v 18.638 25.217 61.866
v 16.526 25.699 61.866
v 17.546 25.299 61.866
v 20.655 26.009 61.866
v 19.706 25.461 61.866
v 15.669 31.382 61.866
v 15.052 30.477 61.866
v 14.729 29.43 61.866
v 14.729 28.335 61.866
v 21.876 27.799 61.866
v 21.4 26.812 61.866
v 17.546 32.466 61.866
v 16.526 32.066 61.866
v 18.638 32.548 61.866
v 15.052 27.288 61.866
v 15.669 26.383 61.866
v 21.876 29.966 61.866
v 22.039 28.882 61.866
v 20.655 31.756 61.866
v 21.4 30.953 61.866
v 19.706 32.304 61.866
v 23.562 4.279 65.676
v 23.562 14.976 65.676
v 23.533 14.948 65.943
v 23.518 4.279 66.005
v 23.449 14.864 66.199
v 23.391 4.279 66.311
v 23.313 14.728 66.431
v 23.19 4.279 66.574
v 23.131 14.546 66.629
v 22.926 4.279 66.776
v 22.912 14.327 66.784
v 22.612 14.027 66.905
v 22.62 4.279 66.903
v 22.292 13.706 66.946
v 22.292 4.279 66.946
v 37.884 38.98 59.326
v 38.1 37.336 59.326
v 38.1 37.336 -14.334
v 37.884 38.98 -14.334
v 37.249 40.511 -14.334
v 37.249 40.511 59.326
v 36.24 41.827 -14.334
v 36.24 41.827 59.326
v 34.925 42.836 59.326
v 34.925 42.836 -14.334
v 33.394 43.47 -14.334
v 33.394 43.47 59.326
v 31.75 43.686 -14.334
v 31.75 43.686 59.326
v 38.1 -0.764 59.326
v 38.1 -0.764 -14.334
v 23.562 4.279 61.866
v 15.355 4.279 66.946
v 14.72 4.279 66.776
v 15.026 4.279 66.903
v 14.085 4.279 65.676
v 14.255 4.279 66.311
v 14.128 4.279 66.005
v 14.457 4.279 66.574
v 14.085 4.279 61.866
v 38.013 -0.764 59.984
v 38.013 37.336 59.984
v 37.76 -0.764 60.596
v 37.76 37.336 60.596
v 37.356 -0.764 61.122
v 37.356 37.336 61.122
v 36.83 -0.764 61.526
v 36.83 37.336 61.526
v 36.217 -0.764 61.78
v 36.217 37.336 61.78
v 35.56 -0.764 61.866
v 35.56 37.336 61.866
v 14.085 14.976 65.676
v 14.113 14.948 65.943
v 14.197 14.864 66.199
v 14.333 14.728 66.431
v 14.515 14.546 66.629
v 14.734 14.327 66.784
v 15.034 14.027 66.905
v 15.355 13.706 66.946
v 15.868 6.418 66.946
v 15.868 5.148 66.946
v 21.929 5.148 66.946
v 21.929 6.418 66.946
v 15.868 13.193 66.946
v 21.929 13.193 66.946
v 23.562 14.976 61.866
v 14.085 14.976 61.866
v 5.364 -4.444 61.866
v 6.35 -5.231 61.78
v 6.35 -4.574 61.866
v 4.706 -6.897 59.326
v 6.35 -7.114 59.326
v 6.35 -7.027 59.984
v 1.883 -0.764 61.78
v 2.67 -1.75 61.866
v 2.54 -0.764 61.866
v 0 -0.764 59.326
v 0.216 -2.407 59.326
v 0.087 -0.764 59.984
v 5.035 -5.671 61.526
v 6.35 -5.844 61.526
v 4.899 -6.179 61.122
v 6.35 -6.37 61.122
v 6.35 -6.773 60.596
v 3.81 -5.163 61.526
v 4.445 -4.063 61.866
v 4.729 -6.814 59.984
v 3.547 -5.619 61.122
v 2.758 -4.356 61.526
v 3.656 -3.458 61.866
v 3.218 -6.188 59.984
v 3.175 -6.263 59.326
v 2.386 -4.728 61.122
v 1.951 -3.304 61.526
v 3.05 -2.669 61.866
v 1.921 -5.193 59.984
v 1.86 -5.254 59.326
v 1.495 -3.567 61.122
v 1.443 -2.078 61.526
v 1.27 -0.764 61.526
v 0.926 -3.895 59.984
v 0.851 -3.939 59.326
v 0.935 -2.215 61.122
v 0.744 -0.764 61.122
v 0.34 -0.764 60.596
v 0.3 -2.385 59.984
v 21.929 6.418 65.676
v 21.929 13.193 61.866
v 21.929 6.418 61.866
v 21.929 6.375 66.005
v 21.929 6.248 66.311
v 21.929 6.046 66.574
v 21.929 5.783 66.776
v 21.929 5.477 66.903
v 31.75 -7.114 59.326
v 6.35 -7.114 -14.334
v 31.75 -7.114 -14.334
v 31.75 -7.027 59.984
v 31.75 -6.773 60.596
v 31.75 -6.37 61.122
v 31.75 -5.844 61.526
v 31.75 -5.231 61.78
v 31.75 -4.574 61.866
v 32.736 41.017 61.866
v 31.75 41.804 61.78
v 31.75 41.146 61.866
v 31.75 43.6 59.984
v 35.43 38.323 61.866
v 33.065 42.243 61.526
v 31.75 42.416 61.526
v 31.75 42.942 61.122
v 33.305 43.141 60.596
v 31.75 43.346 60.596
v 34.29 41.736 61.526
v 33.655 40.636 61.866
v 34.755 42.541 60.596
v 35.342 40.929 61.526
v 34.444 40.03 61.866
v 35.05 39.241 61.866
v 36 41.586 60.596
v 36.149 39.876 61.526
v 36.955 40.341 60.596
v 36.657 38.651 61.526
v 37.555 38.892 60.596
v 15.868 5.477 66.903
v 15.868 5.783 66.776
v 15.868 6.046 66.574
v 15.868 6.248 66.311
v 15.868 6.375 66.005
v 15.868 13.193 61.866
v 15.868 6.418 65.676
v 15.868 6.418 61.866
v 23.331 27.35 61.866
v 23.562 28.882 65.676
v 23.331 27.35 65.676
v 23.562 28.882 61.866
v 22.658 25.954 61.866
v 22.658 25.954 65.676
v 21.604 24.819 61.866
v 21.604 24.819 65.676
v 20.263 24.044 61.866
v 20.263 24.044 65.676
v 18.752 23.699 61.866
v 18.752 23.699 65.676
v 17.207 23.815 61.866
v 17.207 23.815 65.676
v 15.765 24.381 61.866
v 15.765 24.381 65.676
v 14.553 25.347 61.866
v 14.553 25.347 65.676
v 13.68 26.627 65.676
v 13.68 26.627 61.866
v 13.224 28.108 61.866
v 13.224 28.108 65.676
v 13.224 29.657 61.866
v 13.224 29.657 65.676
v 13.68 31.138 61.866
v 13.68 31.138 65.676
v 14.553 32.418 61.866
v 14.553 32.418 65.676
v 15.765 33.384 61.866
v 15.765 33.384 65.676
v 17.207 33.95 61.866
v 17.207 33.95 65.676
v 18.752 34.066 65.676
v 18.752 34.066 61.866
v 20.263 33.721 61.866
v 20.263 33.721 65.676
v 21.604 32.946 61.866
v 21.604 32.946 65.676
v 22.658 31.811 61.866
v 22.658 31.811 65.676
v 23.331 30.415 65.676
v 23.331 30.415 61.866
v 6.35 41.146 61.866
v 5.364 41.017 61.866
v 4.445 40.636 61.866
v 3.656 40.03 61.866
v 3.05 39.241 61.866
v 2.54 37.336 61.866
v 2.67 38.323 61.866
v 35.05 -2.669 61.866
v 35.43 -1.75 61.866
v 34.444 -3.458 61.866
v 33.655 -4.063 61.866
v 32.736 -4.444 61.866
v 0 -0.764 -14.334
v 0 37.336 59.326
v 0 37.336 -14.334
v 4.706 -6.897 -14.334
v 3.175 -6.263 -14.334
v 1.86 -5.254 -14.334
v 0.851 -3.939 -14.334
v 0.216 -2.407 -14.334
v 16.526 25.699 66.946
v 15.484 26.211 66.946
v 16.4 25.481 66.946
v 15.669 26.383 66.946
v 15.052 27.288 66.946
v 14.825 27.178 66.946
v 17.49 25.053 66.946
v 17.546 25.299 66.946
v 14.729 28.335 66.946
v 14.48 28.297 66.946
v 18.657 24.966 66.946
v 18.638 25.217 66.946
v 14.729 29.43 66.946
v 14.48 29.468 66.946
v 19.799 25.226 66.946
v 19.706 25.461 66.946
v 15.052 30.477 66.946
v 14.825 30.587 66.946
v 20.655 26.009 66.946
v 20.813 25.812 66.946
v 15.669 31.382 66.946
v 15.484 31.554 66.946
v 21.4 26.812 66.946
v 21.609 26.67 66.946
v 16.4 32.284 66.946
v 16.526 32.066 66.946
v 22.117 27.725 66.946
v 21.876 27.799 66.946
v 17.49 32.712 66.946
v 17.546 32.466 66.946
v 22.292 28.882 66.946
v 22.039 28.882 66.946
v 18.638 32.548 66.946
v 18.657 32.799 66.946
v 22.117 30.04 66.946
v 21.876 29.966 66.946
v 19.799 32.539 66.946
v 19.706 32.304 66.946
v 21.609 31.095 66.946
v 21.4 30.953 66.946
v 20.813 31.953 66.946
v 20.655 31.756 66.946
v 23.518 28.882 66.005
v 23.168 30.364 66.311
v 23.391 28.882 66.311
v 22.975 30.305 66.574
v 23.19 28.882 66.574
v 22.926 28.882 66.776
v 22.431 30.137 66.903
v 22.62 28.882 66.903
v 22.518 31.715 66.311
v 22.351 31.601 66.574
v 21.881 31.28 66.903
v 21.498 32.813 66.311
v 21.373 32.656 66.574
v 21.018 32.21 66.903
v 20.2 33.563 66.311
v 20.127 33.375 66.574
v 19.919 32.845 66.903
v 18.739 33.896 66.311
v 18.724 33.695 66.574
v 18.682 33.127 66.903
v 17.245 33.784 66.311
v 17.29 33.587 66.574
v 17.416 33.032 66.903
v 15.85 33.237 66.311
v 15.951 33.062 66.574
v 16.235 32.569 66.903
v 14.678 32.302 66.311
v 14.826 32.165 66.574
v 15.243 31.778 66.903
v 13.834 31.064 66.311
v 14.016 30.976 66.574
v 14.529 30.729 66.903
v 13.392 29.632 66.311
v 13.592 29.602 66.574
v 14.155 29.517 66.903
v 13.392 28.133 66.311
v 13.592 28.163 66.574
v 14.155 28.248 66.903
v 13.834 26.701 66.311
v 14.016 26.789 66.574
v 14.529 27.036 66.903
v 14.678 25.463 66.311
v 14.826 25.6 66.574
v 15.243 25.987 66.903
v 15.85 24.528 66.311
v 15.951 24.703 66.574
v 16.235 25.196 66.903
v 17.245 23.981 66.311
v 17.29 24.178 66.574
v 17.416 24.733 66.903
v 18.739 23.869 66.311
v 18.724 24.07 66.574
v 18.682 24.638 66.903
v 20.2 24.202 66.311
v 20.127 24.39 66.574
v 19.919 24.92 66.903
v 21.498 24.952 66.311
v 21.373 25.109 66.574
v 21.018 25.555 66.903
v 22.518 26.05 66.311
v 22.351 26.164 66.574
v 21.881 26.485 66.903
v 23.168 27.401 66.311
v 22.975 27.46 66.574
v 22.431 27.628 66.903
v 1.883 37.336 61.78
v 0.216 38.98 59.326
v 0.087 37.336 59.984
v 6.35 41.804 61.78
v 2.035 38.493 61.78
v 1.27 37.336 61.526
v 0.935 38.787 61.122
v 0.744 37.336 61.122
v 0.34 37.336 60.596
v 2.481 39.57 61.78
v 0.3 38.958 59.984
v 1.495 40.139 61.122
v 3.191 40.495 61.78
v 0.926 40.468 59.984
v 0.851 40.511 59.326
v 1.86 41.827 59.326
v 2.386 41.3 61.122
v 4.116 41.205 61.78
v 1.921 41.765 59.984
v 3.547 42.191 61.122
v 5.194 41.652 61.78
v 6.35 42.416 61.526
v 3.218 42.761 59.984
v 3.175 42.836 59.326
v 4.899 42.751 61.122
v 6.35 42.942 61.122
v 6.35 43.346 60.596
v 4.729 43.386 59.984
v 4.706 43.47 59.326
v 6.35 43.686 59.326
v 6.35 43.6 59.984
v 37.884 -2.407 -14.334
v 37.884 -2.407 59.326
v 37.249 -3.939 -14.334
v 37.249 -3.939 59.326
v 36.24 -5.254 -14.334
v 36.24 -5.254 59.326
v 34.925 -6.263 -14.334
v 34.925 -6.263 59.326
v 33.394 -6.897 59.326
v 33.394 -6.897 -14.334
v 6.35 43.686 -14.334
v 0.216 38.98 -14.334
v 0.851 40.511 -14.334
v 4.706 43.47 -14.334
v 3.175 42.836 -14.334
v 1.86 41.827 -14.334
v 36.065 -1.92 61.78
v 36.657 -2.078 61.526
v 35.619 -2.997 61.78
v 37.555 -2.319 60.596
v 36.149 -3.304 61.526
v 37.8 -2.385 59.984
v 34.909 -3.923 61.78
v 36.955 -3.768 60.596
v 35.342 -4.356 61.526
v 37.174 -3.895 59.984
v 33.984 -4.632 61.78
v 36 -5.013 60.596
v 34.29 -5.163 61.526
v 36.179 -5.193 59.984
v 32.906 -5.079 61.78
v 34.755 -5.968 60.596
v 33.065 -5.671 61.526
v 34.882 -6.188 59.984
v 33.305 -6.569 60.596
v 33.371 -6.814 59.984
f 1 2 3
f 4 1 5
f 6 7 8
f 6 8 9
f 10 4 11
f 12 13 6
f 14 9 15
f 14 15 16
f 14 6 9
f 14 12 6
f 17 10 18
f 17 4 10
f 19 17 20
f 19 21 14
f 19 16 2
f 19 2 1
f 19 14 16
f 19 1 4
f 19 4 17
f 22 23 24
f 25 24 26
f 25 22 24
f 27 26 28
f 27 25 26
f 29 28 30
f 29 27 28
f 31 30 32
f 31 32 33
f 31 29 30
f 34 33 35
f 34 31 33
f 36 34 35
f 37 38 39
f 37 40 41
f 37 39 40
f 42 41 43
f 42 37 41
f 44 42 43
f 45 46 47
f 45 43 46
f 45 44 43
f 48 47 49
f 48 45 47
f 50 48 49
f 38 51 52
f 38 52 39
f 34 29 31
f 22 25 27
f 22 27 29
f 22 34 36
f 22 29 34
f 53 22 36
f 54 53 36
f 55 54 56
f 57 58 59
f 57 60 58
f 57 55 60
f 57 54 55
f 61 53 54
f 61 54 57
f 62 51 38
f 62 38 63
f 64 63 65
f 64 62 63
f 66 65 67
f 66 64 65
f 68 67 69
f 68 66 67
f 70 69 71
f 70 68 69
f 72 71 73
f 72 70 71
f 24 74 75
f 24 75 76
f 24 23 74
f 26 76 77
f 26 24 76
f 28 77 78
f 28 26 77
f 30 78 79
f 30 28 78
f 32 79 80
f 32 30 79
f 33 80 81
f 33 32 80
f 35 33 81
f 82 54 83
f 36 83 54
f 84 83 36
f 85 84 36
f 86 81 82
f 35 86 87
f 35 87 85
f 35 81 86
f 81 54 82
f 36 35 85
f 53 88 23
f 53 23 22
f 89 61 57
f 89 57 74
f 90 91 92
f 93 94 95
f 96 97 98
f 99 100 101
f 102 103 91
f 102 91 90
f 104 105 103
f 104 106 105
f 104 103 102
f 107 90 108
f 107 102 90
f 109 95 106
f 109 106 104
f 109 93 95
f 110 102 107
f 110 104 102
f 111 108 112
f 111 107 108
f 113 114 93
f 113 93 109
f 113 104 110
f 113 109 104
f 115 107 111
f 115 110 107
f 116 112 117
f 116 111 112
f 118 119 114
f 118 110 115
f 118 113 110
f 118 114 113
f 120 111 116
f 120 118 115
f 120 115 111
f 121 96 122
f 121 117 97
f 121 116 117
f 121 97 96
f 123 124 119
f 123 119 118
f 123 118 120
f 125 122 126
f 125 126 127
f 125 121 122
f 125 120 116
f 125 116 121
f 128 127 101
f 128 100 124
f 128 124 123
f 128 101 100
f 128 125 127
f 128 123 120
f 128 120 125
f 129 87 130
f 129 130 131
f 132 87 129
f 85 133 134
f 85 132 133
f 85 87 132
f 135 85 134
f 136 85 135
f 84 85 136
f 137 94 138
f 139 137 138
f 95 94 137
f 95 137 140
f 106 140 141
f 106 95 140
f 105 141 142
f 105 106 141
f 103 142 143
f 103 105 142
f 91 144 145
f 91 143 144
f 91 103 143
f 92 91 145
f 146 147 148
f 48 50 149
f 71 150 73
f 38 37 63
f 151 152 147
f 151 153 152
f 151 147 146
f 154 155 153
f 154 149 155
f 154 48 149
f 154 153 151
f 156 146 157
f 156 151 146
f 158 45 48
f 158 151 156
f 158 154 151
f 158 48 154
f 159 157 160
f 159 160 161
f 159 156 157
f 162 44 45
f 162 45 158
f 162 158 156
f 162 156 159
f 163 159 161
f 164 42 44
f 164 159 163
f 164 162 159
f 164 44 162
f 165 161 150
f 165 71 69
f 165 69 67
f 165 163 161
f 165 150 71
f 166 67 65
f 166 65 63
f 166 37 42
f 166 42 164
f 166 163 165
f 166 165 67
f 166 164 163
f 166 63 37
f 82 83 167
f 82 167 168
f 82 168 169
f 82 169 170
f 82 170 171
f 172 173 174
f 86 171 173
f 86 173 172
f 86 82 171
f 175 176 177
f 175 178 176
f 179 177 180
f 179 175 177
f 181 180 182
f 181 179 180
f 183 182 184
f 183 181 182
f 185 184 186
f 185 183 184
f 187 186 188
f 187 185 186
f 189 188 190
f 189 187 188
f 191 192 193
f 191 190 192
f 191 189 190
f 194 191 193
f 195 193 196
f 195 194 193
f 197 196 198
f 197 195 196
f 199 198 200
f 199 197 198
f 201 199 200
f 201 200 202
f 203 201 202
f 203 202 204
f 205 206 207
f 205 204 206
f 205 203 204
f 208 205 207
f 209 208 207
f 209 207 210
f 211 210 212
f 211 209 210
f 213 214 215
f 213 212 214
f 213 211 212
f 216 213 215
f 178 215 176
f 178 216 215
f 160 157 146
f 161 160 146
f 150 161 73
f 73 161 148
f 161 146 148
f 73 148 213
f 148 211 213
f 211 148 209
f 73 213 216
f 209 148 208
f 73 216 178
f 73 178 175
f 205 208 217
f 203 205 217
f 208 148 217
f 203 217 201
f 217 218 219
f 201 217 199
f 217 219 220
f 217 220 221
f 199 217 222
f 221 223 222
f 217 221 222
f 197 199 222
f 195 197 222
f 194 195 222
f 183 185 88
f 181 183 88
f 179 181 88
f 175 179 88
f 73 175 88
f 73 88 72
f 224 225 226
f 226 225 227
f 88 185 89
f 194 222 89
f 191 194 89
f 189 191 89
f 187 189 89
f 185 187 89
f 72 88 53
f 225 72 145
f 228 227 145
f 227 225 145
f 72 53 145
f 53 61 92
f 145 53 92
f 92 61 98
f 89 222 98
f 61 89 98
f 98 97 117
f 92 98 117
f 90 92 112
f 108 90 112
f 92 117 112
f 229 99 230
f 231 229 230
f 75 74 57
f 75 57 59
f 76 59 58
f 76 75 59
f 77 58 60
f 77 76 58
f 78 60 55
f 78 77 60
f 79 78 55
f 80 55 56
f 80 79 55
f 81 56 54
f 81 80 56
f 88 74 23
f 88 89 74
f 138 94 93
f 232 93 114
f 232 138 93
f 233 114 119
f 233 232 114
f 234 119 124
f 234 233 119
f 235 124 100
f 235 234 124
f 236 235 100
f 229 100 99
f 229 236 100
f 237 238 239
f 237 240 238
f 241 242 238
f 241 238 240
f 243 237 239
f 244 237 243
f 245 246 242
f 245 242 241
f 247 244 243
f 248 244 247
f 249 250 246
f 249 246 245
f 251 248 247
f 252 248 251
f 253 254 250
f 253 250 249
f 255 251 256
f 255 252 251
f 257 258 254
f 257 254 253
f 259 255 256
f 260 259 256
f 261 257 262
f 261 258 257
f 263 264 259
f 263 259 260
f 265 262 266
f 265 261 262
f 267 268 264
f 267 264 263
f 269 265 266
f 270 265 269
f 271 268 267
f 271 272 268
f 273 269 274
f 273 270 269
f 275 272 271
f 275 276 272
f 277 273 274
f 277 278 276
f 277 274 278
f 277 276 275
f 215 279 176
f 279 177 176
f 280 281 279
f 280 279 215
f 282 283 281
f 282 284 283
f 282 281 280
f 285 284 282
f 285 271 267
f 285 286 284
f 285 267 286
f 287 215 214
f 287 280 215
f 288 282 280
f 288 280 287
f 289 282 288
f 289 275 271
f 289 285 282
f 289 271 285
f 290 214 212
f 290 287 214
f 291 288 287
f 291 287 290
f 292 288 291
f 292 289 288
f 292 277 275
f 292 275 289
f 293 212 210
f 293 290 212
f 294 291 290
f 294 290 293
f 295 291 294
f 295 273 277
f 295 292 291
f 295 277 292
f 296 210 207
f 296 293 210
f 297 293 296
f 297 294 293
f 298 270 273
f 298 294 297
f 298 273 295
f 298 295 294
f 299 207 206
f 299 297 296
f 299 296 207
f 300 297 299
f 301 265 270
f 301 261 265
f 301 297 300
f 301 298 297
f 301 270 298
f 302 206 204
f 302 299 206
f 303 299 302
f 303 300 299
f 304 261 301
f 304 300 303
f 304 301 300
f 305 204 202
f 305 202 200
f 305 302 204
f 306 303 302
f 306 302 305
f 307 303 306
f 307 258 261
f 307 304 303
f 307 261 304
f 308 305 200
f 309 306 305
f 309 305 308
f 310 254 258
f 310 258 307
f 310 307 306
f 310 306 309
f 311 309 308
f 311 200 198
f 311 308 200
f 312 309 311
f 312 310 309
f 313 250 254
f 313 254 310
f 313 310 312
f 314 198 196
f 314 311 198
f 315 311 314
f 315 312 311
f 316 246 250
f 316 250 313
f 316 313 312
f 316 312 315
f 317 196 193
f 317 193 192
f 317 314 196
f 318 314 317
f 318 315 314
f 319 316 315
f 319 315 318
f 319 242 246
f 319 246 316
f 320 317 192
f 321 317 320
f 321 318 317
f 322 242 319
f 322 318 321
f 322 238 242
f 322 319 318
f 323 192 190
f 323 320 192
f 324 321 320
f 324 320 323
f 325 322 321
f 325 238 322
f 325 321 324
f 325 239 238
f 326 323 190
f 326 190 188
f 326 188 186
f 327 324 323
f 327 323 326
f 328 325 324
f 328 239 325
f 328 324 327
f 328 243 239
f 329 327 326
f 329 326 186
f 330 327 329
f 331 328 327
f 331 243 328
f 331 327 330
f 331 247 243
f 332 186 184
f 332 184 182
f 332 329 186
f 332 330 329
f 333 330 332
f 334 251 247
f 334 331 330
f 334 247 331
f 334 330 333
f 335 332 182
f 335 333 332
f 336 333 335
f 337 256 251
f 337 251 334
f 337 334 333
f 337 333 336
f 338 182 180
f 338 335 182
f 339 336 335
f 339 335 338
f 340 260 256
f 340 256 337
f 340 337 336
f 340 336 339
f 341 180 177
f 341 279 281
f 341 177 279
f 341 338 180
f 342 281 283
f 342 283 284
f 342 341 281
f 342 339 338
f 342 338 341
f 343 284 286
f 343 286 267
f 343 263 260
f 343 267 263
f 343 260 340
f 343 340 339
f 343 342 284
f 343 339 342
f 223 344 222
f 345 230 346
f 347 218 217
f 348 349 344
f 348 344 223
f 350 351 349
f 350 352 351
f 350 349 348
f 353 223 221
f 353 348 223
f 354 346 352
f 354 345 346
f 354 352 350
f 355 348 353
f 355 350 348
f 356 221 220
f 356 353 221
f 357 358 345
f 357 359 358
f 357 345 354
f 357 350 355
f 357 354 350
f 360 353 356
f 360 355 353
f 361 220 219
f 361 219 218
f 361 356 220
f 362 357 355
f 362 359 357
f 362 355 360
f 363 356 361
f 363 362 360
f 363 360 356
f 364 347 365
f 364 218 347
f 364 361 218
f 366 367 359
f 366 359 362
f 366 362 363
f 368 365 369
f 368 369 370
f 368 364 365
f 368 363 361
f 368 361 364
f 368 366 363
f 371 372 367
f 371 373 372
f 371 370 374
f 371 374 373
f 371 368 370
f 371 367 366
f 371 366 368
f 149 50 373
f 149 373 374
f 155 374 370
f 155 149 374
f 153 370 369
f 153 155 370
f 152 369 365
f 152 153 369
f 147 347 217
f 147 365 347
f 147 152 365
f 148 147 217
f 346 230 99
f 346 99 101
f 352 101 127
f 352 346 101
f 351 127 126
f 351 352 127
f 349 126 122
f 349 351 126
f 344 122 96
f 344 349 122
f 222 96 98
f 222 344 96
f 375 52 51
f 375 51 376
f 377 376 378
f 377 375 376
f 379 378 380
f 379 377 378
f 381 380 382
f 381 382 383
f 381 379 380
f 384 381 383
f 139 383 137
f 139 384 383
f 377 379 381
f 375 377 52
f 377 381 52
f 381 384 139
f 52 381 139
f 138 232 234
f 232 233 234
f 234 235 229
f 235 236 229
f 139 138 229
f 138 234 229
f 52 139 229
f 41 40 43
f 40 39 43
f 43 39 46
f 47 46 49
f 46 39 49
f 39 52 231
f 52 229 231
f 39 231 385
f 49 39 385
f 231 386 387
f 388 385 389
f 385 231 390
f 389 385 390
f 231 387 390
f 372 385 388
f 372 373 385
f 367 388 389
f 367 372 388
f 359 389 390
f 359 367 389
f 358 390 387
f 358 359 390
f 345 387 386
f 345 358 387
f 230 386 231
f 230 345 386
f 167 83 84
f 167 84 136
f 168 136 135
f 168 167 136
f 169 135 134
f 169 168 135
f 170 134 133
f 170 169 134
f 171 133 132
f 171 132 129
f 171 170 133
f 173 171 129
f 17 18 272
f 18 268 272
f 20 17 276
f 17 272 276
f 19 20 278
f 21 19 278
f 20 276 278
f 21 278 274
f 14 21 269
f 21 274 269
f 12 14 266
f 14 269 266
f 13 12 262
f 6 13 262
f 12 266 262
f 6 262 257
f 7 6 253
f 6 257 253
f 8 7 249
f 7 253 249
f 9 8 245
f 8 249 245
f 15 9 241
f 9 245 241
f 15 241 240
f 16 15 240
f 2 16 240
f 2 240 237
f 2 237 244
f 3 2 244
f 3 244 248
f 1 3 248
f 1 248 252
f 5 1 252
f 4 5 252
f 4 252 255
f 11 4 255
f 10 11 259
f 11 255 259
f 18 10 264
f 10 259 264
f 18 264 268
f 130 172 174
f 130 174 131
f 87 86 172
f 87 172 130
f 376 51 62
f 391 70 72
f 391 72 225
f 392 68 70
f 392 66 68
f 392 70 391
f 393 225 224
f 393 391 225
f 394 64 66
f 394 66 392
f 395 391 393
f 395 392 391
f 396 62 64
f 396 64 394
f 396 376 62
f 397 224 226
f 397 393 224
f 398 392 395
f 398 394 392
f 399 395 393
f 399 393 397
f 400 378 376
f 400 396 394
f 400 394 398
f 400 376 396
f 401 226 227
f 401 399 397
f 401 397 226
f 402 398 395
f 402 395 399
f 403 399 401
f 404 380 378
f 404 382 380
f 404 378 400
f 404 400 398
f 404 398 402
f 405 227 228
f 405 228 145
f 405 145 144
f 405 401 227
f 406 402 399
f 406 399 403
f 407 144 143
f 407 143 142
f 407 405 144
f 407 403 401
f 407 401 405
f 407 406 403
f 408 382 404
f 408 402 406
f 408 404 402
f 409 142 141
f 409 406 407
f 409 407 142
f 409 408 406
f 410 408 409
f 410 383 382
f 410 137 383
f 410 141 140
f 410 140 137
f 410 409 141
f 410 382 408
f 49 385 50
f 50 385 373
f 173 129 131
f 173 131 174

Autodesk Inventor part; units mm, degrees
ref_plane "YZ Plane" through (0, 0, 0) normal (1, 0, 0) x (0, 1, 0)
ref_plane "XZ Plane" through (0, 0, 0) normal (0, 1, 0) x (-1, 0, 0)
ref_plane "XY Plane" through (0, 0, 0) normal (0, 0, 1) x (1, 0, 0)
sketch "Sketch1" plane through (0, 0, 0) normal (1, 0, 0) x (0, 1, 0)
  line L0 (43.6864, 61.8662) -> (-7.1136, 61.8662)
  line L1 (-7.1136, 61.8662) -> (-7.1136, -14.3338)
  line L2 (-7.1136, -14.3338) -> (43.6864, -14.3338)
  line L3 (43.6864, -14.3338) -> (43.6864, 61.8662)
  point P0 (0, 0)
extrude "Extrusion1" add sketch "Sketch1" along normal blind 38.1
fillet "Fillet1" radius 6.35 4 edges at (38.1, 43.6864, 23.7662) (0, 43.6864, 23.7662) (38.1, -7.1136, 23.7662) (0, -7.1136, 23.7662)
sketch "Sketch2" plane through (0, -0.7636, 61.8662) normal (0, 0, 1) x (1, 0, 0)
  circle A0 centre (18.3636, 29.6461) radius 5.1979
  line L0 (14.0847, 15.7397) -> (23.5615, 15.7397)
  line L1 (23.5615, 15.7397) -> (23.5615, 5.0424)
  line L2 (23.5615, 5.0424) -> (14.0847, 5.0424)
  line L3 (14.0847, 5.0424) -> (14.0847, 15.7397)
  point P0 (0, 0.7636)
extrude "Extrusion2" add sketch "Sketch2" along normal blind 5.08
sketch "Sketch3" plane through (18.3636, 28.8825, 66.9462) normal (0, 0, 1) x (1, 0, 0)
  circle A0 centre (0, 0) radius 3.6755
  point P0 (-18.3636, -28.8825)
extrude "Extrusion3" cut sketch "Sketch3" against normal blind 5.08
sketch "Sketch4" plane through (0, -0.7636, 66.9462) normal (0, 0, 1) x (1, 0, 0)
  line L0 (15.8676, 13.9568) -> (21.9293, 13.9568)
  line L1 (21.9293, 13.9568) -> (21.9293, 7.1819)
  line L2 (21.9293, 7.1819) -> (15.8676, 7.1819)
  line L3 (15.8676, 7.1819) -> (15.8676, 13.9568)
  point P0 (0, 0.7636)
extrude "Extrusion4" cut sketch "Sketch4" against normal blind 5.08
fillet "Fillet2" radius 1.27 4 edges at (18.8231, 14.9761, 66.9462) (23.5615, 9.6275, 66.9462) (18.8984, 6.4183, 66.9462) (14.0847, 9.6275, 66.9462)
fillet "Fillet3" radius 1.27 1 edges at (13.1657, 28.8825, 66.9462)
fillet "Fillet4" radius 2.54 8 edges at (36.2401, 41.8266, 61.8662) (38.1, 18.2864, 61.8662) (36.2401, -5.2537, 61.8662) (19.05, -7.1136, 61.8662) (1.8599, -5.2537, 61.8662) (0, 18.2864, 61.8662) (1.8599, 41.8266, 61.8662) (19.05, 43.6864, 61.8662)
properties part number "Battery1" material "Lead"
